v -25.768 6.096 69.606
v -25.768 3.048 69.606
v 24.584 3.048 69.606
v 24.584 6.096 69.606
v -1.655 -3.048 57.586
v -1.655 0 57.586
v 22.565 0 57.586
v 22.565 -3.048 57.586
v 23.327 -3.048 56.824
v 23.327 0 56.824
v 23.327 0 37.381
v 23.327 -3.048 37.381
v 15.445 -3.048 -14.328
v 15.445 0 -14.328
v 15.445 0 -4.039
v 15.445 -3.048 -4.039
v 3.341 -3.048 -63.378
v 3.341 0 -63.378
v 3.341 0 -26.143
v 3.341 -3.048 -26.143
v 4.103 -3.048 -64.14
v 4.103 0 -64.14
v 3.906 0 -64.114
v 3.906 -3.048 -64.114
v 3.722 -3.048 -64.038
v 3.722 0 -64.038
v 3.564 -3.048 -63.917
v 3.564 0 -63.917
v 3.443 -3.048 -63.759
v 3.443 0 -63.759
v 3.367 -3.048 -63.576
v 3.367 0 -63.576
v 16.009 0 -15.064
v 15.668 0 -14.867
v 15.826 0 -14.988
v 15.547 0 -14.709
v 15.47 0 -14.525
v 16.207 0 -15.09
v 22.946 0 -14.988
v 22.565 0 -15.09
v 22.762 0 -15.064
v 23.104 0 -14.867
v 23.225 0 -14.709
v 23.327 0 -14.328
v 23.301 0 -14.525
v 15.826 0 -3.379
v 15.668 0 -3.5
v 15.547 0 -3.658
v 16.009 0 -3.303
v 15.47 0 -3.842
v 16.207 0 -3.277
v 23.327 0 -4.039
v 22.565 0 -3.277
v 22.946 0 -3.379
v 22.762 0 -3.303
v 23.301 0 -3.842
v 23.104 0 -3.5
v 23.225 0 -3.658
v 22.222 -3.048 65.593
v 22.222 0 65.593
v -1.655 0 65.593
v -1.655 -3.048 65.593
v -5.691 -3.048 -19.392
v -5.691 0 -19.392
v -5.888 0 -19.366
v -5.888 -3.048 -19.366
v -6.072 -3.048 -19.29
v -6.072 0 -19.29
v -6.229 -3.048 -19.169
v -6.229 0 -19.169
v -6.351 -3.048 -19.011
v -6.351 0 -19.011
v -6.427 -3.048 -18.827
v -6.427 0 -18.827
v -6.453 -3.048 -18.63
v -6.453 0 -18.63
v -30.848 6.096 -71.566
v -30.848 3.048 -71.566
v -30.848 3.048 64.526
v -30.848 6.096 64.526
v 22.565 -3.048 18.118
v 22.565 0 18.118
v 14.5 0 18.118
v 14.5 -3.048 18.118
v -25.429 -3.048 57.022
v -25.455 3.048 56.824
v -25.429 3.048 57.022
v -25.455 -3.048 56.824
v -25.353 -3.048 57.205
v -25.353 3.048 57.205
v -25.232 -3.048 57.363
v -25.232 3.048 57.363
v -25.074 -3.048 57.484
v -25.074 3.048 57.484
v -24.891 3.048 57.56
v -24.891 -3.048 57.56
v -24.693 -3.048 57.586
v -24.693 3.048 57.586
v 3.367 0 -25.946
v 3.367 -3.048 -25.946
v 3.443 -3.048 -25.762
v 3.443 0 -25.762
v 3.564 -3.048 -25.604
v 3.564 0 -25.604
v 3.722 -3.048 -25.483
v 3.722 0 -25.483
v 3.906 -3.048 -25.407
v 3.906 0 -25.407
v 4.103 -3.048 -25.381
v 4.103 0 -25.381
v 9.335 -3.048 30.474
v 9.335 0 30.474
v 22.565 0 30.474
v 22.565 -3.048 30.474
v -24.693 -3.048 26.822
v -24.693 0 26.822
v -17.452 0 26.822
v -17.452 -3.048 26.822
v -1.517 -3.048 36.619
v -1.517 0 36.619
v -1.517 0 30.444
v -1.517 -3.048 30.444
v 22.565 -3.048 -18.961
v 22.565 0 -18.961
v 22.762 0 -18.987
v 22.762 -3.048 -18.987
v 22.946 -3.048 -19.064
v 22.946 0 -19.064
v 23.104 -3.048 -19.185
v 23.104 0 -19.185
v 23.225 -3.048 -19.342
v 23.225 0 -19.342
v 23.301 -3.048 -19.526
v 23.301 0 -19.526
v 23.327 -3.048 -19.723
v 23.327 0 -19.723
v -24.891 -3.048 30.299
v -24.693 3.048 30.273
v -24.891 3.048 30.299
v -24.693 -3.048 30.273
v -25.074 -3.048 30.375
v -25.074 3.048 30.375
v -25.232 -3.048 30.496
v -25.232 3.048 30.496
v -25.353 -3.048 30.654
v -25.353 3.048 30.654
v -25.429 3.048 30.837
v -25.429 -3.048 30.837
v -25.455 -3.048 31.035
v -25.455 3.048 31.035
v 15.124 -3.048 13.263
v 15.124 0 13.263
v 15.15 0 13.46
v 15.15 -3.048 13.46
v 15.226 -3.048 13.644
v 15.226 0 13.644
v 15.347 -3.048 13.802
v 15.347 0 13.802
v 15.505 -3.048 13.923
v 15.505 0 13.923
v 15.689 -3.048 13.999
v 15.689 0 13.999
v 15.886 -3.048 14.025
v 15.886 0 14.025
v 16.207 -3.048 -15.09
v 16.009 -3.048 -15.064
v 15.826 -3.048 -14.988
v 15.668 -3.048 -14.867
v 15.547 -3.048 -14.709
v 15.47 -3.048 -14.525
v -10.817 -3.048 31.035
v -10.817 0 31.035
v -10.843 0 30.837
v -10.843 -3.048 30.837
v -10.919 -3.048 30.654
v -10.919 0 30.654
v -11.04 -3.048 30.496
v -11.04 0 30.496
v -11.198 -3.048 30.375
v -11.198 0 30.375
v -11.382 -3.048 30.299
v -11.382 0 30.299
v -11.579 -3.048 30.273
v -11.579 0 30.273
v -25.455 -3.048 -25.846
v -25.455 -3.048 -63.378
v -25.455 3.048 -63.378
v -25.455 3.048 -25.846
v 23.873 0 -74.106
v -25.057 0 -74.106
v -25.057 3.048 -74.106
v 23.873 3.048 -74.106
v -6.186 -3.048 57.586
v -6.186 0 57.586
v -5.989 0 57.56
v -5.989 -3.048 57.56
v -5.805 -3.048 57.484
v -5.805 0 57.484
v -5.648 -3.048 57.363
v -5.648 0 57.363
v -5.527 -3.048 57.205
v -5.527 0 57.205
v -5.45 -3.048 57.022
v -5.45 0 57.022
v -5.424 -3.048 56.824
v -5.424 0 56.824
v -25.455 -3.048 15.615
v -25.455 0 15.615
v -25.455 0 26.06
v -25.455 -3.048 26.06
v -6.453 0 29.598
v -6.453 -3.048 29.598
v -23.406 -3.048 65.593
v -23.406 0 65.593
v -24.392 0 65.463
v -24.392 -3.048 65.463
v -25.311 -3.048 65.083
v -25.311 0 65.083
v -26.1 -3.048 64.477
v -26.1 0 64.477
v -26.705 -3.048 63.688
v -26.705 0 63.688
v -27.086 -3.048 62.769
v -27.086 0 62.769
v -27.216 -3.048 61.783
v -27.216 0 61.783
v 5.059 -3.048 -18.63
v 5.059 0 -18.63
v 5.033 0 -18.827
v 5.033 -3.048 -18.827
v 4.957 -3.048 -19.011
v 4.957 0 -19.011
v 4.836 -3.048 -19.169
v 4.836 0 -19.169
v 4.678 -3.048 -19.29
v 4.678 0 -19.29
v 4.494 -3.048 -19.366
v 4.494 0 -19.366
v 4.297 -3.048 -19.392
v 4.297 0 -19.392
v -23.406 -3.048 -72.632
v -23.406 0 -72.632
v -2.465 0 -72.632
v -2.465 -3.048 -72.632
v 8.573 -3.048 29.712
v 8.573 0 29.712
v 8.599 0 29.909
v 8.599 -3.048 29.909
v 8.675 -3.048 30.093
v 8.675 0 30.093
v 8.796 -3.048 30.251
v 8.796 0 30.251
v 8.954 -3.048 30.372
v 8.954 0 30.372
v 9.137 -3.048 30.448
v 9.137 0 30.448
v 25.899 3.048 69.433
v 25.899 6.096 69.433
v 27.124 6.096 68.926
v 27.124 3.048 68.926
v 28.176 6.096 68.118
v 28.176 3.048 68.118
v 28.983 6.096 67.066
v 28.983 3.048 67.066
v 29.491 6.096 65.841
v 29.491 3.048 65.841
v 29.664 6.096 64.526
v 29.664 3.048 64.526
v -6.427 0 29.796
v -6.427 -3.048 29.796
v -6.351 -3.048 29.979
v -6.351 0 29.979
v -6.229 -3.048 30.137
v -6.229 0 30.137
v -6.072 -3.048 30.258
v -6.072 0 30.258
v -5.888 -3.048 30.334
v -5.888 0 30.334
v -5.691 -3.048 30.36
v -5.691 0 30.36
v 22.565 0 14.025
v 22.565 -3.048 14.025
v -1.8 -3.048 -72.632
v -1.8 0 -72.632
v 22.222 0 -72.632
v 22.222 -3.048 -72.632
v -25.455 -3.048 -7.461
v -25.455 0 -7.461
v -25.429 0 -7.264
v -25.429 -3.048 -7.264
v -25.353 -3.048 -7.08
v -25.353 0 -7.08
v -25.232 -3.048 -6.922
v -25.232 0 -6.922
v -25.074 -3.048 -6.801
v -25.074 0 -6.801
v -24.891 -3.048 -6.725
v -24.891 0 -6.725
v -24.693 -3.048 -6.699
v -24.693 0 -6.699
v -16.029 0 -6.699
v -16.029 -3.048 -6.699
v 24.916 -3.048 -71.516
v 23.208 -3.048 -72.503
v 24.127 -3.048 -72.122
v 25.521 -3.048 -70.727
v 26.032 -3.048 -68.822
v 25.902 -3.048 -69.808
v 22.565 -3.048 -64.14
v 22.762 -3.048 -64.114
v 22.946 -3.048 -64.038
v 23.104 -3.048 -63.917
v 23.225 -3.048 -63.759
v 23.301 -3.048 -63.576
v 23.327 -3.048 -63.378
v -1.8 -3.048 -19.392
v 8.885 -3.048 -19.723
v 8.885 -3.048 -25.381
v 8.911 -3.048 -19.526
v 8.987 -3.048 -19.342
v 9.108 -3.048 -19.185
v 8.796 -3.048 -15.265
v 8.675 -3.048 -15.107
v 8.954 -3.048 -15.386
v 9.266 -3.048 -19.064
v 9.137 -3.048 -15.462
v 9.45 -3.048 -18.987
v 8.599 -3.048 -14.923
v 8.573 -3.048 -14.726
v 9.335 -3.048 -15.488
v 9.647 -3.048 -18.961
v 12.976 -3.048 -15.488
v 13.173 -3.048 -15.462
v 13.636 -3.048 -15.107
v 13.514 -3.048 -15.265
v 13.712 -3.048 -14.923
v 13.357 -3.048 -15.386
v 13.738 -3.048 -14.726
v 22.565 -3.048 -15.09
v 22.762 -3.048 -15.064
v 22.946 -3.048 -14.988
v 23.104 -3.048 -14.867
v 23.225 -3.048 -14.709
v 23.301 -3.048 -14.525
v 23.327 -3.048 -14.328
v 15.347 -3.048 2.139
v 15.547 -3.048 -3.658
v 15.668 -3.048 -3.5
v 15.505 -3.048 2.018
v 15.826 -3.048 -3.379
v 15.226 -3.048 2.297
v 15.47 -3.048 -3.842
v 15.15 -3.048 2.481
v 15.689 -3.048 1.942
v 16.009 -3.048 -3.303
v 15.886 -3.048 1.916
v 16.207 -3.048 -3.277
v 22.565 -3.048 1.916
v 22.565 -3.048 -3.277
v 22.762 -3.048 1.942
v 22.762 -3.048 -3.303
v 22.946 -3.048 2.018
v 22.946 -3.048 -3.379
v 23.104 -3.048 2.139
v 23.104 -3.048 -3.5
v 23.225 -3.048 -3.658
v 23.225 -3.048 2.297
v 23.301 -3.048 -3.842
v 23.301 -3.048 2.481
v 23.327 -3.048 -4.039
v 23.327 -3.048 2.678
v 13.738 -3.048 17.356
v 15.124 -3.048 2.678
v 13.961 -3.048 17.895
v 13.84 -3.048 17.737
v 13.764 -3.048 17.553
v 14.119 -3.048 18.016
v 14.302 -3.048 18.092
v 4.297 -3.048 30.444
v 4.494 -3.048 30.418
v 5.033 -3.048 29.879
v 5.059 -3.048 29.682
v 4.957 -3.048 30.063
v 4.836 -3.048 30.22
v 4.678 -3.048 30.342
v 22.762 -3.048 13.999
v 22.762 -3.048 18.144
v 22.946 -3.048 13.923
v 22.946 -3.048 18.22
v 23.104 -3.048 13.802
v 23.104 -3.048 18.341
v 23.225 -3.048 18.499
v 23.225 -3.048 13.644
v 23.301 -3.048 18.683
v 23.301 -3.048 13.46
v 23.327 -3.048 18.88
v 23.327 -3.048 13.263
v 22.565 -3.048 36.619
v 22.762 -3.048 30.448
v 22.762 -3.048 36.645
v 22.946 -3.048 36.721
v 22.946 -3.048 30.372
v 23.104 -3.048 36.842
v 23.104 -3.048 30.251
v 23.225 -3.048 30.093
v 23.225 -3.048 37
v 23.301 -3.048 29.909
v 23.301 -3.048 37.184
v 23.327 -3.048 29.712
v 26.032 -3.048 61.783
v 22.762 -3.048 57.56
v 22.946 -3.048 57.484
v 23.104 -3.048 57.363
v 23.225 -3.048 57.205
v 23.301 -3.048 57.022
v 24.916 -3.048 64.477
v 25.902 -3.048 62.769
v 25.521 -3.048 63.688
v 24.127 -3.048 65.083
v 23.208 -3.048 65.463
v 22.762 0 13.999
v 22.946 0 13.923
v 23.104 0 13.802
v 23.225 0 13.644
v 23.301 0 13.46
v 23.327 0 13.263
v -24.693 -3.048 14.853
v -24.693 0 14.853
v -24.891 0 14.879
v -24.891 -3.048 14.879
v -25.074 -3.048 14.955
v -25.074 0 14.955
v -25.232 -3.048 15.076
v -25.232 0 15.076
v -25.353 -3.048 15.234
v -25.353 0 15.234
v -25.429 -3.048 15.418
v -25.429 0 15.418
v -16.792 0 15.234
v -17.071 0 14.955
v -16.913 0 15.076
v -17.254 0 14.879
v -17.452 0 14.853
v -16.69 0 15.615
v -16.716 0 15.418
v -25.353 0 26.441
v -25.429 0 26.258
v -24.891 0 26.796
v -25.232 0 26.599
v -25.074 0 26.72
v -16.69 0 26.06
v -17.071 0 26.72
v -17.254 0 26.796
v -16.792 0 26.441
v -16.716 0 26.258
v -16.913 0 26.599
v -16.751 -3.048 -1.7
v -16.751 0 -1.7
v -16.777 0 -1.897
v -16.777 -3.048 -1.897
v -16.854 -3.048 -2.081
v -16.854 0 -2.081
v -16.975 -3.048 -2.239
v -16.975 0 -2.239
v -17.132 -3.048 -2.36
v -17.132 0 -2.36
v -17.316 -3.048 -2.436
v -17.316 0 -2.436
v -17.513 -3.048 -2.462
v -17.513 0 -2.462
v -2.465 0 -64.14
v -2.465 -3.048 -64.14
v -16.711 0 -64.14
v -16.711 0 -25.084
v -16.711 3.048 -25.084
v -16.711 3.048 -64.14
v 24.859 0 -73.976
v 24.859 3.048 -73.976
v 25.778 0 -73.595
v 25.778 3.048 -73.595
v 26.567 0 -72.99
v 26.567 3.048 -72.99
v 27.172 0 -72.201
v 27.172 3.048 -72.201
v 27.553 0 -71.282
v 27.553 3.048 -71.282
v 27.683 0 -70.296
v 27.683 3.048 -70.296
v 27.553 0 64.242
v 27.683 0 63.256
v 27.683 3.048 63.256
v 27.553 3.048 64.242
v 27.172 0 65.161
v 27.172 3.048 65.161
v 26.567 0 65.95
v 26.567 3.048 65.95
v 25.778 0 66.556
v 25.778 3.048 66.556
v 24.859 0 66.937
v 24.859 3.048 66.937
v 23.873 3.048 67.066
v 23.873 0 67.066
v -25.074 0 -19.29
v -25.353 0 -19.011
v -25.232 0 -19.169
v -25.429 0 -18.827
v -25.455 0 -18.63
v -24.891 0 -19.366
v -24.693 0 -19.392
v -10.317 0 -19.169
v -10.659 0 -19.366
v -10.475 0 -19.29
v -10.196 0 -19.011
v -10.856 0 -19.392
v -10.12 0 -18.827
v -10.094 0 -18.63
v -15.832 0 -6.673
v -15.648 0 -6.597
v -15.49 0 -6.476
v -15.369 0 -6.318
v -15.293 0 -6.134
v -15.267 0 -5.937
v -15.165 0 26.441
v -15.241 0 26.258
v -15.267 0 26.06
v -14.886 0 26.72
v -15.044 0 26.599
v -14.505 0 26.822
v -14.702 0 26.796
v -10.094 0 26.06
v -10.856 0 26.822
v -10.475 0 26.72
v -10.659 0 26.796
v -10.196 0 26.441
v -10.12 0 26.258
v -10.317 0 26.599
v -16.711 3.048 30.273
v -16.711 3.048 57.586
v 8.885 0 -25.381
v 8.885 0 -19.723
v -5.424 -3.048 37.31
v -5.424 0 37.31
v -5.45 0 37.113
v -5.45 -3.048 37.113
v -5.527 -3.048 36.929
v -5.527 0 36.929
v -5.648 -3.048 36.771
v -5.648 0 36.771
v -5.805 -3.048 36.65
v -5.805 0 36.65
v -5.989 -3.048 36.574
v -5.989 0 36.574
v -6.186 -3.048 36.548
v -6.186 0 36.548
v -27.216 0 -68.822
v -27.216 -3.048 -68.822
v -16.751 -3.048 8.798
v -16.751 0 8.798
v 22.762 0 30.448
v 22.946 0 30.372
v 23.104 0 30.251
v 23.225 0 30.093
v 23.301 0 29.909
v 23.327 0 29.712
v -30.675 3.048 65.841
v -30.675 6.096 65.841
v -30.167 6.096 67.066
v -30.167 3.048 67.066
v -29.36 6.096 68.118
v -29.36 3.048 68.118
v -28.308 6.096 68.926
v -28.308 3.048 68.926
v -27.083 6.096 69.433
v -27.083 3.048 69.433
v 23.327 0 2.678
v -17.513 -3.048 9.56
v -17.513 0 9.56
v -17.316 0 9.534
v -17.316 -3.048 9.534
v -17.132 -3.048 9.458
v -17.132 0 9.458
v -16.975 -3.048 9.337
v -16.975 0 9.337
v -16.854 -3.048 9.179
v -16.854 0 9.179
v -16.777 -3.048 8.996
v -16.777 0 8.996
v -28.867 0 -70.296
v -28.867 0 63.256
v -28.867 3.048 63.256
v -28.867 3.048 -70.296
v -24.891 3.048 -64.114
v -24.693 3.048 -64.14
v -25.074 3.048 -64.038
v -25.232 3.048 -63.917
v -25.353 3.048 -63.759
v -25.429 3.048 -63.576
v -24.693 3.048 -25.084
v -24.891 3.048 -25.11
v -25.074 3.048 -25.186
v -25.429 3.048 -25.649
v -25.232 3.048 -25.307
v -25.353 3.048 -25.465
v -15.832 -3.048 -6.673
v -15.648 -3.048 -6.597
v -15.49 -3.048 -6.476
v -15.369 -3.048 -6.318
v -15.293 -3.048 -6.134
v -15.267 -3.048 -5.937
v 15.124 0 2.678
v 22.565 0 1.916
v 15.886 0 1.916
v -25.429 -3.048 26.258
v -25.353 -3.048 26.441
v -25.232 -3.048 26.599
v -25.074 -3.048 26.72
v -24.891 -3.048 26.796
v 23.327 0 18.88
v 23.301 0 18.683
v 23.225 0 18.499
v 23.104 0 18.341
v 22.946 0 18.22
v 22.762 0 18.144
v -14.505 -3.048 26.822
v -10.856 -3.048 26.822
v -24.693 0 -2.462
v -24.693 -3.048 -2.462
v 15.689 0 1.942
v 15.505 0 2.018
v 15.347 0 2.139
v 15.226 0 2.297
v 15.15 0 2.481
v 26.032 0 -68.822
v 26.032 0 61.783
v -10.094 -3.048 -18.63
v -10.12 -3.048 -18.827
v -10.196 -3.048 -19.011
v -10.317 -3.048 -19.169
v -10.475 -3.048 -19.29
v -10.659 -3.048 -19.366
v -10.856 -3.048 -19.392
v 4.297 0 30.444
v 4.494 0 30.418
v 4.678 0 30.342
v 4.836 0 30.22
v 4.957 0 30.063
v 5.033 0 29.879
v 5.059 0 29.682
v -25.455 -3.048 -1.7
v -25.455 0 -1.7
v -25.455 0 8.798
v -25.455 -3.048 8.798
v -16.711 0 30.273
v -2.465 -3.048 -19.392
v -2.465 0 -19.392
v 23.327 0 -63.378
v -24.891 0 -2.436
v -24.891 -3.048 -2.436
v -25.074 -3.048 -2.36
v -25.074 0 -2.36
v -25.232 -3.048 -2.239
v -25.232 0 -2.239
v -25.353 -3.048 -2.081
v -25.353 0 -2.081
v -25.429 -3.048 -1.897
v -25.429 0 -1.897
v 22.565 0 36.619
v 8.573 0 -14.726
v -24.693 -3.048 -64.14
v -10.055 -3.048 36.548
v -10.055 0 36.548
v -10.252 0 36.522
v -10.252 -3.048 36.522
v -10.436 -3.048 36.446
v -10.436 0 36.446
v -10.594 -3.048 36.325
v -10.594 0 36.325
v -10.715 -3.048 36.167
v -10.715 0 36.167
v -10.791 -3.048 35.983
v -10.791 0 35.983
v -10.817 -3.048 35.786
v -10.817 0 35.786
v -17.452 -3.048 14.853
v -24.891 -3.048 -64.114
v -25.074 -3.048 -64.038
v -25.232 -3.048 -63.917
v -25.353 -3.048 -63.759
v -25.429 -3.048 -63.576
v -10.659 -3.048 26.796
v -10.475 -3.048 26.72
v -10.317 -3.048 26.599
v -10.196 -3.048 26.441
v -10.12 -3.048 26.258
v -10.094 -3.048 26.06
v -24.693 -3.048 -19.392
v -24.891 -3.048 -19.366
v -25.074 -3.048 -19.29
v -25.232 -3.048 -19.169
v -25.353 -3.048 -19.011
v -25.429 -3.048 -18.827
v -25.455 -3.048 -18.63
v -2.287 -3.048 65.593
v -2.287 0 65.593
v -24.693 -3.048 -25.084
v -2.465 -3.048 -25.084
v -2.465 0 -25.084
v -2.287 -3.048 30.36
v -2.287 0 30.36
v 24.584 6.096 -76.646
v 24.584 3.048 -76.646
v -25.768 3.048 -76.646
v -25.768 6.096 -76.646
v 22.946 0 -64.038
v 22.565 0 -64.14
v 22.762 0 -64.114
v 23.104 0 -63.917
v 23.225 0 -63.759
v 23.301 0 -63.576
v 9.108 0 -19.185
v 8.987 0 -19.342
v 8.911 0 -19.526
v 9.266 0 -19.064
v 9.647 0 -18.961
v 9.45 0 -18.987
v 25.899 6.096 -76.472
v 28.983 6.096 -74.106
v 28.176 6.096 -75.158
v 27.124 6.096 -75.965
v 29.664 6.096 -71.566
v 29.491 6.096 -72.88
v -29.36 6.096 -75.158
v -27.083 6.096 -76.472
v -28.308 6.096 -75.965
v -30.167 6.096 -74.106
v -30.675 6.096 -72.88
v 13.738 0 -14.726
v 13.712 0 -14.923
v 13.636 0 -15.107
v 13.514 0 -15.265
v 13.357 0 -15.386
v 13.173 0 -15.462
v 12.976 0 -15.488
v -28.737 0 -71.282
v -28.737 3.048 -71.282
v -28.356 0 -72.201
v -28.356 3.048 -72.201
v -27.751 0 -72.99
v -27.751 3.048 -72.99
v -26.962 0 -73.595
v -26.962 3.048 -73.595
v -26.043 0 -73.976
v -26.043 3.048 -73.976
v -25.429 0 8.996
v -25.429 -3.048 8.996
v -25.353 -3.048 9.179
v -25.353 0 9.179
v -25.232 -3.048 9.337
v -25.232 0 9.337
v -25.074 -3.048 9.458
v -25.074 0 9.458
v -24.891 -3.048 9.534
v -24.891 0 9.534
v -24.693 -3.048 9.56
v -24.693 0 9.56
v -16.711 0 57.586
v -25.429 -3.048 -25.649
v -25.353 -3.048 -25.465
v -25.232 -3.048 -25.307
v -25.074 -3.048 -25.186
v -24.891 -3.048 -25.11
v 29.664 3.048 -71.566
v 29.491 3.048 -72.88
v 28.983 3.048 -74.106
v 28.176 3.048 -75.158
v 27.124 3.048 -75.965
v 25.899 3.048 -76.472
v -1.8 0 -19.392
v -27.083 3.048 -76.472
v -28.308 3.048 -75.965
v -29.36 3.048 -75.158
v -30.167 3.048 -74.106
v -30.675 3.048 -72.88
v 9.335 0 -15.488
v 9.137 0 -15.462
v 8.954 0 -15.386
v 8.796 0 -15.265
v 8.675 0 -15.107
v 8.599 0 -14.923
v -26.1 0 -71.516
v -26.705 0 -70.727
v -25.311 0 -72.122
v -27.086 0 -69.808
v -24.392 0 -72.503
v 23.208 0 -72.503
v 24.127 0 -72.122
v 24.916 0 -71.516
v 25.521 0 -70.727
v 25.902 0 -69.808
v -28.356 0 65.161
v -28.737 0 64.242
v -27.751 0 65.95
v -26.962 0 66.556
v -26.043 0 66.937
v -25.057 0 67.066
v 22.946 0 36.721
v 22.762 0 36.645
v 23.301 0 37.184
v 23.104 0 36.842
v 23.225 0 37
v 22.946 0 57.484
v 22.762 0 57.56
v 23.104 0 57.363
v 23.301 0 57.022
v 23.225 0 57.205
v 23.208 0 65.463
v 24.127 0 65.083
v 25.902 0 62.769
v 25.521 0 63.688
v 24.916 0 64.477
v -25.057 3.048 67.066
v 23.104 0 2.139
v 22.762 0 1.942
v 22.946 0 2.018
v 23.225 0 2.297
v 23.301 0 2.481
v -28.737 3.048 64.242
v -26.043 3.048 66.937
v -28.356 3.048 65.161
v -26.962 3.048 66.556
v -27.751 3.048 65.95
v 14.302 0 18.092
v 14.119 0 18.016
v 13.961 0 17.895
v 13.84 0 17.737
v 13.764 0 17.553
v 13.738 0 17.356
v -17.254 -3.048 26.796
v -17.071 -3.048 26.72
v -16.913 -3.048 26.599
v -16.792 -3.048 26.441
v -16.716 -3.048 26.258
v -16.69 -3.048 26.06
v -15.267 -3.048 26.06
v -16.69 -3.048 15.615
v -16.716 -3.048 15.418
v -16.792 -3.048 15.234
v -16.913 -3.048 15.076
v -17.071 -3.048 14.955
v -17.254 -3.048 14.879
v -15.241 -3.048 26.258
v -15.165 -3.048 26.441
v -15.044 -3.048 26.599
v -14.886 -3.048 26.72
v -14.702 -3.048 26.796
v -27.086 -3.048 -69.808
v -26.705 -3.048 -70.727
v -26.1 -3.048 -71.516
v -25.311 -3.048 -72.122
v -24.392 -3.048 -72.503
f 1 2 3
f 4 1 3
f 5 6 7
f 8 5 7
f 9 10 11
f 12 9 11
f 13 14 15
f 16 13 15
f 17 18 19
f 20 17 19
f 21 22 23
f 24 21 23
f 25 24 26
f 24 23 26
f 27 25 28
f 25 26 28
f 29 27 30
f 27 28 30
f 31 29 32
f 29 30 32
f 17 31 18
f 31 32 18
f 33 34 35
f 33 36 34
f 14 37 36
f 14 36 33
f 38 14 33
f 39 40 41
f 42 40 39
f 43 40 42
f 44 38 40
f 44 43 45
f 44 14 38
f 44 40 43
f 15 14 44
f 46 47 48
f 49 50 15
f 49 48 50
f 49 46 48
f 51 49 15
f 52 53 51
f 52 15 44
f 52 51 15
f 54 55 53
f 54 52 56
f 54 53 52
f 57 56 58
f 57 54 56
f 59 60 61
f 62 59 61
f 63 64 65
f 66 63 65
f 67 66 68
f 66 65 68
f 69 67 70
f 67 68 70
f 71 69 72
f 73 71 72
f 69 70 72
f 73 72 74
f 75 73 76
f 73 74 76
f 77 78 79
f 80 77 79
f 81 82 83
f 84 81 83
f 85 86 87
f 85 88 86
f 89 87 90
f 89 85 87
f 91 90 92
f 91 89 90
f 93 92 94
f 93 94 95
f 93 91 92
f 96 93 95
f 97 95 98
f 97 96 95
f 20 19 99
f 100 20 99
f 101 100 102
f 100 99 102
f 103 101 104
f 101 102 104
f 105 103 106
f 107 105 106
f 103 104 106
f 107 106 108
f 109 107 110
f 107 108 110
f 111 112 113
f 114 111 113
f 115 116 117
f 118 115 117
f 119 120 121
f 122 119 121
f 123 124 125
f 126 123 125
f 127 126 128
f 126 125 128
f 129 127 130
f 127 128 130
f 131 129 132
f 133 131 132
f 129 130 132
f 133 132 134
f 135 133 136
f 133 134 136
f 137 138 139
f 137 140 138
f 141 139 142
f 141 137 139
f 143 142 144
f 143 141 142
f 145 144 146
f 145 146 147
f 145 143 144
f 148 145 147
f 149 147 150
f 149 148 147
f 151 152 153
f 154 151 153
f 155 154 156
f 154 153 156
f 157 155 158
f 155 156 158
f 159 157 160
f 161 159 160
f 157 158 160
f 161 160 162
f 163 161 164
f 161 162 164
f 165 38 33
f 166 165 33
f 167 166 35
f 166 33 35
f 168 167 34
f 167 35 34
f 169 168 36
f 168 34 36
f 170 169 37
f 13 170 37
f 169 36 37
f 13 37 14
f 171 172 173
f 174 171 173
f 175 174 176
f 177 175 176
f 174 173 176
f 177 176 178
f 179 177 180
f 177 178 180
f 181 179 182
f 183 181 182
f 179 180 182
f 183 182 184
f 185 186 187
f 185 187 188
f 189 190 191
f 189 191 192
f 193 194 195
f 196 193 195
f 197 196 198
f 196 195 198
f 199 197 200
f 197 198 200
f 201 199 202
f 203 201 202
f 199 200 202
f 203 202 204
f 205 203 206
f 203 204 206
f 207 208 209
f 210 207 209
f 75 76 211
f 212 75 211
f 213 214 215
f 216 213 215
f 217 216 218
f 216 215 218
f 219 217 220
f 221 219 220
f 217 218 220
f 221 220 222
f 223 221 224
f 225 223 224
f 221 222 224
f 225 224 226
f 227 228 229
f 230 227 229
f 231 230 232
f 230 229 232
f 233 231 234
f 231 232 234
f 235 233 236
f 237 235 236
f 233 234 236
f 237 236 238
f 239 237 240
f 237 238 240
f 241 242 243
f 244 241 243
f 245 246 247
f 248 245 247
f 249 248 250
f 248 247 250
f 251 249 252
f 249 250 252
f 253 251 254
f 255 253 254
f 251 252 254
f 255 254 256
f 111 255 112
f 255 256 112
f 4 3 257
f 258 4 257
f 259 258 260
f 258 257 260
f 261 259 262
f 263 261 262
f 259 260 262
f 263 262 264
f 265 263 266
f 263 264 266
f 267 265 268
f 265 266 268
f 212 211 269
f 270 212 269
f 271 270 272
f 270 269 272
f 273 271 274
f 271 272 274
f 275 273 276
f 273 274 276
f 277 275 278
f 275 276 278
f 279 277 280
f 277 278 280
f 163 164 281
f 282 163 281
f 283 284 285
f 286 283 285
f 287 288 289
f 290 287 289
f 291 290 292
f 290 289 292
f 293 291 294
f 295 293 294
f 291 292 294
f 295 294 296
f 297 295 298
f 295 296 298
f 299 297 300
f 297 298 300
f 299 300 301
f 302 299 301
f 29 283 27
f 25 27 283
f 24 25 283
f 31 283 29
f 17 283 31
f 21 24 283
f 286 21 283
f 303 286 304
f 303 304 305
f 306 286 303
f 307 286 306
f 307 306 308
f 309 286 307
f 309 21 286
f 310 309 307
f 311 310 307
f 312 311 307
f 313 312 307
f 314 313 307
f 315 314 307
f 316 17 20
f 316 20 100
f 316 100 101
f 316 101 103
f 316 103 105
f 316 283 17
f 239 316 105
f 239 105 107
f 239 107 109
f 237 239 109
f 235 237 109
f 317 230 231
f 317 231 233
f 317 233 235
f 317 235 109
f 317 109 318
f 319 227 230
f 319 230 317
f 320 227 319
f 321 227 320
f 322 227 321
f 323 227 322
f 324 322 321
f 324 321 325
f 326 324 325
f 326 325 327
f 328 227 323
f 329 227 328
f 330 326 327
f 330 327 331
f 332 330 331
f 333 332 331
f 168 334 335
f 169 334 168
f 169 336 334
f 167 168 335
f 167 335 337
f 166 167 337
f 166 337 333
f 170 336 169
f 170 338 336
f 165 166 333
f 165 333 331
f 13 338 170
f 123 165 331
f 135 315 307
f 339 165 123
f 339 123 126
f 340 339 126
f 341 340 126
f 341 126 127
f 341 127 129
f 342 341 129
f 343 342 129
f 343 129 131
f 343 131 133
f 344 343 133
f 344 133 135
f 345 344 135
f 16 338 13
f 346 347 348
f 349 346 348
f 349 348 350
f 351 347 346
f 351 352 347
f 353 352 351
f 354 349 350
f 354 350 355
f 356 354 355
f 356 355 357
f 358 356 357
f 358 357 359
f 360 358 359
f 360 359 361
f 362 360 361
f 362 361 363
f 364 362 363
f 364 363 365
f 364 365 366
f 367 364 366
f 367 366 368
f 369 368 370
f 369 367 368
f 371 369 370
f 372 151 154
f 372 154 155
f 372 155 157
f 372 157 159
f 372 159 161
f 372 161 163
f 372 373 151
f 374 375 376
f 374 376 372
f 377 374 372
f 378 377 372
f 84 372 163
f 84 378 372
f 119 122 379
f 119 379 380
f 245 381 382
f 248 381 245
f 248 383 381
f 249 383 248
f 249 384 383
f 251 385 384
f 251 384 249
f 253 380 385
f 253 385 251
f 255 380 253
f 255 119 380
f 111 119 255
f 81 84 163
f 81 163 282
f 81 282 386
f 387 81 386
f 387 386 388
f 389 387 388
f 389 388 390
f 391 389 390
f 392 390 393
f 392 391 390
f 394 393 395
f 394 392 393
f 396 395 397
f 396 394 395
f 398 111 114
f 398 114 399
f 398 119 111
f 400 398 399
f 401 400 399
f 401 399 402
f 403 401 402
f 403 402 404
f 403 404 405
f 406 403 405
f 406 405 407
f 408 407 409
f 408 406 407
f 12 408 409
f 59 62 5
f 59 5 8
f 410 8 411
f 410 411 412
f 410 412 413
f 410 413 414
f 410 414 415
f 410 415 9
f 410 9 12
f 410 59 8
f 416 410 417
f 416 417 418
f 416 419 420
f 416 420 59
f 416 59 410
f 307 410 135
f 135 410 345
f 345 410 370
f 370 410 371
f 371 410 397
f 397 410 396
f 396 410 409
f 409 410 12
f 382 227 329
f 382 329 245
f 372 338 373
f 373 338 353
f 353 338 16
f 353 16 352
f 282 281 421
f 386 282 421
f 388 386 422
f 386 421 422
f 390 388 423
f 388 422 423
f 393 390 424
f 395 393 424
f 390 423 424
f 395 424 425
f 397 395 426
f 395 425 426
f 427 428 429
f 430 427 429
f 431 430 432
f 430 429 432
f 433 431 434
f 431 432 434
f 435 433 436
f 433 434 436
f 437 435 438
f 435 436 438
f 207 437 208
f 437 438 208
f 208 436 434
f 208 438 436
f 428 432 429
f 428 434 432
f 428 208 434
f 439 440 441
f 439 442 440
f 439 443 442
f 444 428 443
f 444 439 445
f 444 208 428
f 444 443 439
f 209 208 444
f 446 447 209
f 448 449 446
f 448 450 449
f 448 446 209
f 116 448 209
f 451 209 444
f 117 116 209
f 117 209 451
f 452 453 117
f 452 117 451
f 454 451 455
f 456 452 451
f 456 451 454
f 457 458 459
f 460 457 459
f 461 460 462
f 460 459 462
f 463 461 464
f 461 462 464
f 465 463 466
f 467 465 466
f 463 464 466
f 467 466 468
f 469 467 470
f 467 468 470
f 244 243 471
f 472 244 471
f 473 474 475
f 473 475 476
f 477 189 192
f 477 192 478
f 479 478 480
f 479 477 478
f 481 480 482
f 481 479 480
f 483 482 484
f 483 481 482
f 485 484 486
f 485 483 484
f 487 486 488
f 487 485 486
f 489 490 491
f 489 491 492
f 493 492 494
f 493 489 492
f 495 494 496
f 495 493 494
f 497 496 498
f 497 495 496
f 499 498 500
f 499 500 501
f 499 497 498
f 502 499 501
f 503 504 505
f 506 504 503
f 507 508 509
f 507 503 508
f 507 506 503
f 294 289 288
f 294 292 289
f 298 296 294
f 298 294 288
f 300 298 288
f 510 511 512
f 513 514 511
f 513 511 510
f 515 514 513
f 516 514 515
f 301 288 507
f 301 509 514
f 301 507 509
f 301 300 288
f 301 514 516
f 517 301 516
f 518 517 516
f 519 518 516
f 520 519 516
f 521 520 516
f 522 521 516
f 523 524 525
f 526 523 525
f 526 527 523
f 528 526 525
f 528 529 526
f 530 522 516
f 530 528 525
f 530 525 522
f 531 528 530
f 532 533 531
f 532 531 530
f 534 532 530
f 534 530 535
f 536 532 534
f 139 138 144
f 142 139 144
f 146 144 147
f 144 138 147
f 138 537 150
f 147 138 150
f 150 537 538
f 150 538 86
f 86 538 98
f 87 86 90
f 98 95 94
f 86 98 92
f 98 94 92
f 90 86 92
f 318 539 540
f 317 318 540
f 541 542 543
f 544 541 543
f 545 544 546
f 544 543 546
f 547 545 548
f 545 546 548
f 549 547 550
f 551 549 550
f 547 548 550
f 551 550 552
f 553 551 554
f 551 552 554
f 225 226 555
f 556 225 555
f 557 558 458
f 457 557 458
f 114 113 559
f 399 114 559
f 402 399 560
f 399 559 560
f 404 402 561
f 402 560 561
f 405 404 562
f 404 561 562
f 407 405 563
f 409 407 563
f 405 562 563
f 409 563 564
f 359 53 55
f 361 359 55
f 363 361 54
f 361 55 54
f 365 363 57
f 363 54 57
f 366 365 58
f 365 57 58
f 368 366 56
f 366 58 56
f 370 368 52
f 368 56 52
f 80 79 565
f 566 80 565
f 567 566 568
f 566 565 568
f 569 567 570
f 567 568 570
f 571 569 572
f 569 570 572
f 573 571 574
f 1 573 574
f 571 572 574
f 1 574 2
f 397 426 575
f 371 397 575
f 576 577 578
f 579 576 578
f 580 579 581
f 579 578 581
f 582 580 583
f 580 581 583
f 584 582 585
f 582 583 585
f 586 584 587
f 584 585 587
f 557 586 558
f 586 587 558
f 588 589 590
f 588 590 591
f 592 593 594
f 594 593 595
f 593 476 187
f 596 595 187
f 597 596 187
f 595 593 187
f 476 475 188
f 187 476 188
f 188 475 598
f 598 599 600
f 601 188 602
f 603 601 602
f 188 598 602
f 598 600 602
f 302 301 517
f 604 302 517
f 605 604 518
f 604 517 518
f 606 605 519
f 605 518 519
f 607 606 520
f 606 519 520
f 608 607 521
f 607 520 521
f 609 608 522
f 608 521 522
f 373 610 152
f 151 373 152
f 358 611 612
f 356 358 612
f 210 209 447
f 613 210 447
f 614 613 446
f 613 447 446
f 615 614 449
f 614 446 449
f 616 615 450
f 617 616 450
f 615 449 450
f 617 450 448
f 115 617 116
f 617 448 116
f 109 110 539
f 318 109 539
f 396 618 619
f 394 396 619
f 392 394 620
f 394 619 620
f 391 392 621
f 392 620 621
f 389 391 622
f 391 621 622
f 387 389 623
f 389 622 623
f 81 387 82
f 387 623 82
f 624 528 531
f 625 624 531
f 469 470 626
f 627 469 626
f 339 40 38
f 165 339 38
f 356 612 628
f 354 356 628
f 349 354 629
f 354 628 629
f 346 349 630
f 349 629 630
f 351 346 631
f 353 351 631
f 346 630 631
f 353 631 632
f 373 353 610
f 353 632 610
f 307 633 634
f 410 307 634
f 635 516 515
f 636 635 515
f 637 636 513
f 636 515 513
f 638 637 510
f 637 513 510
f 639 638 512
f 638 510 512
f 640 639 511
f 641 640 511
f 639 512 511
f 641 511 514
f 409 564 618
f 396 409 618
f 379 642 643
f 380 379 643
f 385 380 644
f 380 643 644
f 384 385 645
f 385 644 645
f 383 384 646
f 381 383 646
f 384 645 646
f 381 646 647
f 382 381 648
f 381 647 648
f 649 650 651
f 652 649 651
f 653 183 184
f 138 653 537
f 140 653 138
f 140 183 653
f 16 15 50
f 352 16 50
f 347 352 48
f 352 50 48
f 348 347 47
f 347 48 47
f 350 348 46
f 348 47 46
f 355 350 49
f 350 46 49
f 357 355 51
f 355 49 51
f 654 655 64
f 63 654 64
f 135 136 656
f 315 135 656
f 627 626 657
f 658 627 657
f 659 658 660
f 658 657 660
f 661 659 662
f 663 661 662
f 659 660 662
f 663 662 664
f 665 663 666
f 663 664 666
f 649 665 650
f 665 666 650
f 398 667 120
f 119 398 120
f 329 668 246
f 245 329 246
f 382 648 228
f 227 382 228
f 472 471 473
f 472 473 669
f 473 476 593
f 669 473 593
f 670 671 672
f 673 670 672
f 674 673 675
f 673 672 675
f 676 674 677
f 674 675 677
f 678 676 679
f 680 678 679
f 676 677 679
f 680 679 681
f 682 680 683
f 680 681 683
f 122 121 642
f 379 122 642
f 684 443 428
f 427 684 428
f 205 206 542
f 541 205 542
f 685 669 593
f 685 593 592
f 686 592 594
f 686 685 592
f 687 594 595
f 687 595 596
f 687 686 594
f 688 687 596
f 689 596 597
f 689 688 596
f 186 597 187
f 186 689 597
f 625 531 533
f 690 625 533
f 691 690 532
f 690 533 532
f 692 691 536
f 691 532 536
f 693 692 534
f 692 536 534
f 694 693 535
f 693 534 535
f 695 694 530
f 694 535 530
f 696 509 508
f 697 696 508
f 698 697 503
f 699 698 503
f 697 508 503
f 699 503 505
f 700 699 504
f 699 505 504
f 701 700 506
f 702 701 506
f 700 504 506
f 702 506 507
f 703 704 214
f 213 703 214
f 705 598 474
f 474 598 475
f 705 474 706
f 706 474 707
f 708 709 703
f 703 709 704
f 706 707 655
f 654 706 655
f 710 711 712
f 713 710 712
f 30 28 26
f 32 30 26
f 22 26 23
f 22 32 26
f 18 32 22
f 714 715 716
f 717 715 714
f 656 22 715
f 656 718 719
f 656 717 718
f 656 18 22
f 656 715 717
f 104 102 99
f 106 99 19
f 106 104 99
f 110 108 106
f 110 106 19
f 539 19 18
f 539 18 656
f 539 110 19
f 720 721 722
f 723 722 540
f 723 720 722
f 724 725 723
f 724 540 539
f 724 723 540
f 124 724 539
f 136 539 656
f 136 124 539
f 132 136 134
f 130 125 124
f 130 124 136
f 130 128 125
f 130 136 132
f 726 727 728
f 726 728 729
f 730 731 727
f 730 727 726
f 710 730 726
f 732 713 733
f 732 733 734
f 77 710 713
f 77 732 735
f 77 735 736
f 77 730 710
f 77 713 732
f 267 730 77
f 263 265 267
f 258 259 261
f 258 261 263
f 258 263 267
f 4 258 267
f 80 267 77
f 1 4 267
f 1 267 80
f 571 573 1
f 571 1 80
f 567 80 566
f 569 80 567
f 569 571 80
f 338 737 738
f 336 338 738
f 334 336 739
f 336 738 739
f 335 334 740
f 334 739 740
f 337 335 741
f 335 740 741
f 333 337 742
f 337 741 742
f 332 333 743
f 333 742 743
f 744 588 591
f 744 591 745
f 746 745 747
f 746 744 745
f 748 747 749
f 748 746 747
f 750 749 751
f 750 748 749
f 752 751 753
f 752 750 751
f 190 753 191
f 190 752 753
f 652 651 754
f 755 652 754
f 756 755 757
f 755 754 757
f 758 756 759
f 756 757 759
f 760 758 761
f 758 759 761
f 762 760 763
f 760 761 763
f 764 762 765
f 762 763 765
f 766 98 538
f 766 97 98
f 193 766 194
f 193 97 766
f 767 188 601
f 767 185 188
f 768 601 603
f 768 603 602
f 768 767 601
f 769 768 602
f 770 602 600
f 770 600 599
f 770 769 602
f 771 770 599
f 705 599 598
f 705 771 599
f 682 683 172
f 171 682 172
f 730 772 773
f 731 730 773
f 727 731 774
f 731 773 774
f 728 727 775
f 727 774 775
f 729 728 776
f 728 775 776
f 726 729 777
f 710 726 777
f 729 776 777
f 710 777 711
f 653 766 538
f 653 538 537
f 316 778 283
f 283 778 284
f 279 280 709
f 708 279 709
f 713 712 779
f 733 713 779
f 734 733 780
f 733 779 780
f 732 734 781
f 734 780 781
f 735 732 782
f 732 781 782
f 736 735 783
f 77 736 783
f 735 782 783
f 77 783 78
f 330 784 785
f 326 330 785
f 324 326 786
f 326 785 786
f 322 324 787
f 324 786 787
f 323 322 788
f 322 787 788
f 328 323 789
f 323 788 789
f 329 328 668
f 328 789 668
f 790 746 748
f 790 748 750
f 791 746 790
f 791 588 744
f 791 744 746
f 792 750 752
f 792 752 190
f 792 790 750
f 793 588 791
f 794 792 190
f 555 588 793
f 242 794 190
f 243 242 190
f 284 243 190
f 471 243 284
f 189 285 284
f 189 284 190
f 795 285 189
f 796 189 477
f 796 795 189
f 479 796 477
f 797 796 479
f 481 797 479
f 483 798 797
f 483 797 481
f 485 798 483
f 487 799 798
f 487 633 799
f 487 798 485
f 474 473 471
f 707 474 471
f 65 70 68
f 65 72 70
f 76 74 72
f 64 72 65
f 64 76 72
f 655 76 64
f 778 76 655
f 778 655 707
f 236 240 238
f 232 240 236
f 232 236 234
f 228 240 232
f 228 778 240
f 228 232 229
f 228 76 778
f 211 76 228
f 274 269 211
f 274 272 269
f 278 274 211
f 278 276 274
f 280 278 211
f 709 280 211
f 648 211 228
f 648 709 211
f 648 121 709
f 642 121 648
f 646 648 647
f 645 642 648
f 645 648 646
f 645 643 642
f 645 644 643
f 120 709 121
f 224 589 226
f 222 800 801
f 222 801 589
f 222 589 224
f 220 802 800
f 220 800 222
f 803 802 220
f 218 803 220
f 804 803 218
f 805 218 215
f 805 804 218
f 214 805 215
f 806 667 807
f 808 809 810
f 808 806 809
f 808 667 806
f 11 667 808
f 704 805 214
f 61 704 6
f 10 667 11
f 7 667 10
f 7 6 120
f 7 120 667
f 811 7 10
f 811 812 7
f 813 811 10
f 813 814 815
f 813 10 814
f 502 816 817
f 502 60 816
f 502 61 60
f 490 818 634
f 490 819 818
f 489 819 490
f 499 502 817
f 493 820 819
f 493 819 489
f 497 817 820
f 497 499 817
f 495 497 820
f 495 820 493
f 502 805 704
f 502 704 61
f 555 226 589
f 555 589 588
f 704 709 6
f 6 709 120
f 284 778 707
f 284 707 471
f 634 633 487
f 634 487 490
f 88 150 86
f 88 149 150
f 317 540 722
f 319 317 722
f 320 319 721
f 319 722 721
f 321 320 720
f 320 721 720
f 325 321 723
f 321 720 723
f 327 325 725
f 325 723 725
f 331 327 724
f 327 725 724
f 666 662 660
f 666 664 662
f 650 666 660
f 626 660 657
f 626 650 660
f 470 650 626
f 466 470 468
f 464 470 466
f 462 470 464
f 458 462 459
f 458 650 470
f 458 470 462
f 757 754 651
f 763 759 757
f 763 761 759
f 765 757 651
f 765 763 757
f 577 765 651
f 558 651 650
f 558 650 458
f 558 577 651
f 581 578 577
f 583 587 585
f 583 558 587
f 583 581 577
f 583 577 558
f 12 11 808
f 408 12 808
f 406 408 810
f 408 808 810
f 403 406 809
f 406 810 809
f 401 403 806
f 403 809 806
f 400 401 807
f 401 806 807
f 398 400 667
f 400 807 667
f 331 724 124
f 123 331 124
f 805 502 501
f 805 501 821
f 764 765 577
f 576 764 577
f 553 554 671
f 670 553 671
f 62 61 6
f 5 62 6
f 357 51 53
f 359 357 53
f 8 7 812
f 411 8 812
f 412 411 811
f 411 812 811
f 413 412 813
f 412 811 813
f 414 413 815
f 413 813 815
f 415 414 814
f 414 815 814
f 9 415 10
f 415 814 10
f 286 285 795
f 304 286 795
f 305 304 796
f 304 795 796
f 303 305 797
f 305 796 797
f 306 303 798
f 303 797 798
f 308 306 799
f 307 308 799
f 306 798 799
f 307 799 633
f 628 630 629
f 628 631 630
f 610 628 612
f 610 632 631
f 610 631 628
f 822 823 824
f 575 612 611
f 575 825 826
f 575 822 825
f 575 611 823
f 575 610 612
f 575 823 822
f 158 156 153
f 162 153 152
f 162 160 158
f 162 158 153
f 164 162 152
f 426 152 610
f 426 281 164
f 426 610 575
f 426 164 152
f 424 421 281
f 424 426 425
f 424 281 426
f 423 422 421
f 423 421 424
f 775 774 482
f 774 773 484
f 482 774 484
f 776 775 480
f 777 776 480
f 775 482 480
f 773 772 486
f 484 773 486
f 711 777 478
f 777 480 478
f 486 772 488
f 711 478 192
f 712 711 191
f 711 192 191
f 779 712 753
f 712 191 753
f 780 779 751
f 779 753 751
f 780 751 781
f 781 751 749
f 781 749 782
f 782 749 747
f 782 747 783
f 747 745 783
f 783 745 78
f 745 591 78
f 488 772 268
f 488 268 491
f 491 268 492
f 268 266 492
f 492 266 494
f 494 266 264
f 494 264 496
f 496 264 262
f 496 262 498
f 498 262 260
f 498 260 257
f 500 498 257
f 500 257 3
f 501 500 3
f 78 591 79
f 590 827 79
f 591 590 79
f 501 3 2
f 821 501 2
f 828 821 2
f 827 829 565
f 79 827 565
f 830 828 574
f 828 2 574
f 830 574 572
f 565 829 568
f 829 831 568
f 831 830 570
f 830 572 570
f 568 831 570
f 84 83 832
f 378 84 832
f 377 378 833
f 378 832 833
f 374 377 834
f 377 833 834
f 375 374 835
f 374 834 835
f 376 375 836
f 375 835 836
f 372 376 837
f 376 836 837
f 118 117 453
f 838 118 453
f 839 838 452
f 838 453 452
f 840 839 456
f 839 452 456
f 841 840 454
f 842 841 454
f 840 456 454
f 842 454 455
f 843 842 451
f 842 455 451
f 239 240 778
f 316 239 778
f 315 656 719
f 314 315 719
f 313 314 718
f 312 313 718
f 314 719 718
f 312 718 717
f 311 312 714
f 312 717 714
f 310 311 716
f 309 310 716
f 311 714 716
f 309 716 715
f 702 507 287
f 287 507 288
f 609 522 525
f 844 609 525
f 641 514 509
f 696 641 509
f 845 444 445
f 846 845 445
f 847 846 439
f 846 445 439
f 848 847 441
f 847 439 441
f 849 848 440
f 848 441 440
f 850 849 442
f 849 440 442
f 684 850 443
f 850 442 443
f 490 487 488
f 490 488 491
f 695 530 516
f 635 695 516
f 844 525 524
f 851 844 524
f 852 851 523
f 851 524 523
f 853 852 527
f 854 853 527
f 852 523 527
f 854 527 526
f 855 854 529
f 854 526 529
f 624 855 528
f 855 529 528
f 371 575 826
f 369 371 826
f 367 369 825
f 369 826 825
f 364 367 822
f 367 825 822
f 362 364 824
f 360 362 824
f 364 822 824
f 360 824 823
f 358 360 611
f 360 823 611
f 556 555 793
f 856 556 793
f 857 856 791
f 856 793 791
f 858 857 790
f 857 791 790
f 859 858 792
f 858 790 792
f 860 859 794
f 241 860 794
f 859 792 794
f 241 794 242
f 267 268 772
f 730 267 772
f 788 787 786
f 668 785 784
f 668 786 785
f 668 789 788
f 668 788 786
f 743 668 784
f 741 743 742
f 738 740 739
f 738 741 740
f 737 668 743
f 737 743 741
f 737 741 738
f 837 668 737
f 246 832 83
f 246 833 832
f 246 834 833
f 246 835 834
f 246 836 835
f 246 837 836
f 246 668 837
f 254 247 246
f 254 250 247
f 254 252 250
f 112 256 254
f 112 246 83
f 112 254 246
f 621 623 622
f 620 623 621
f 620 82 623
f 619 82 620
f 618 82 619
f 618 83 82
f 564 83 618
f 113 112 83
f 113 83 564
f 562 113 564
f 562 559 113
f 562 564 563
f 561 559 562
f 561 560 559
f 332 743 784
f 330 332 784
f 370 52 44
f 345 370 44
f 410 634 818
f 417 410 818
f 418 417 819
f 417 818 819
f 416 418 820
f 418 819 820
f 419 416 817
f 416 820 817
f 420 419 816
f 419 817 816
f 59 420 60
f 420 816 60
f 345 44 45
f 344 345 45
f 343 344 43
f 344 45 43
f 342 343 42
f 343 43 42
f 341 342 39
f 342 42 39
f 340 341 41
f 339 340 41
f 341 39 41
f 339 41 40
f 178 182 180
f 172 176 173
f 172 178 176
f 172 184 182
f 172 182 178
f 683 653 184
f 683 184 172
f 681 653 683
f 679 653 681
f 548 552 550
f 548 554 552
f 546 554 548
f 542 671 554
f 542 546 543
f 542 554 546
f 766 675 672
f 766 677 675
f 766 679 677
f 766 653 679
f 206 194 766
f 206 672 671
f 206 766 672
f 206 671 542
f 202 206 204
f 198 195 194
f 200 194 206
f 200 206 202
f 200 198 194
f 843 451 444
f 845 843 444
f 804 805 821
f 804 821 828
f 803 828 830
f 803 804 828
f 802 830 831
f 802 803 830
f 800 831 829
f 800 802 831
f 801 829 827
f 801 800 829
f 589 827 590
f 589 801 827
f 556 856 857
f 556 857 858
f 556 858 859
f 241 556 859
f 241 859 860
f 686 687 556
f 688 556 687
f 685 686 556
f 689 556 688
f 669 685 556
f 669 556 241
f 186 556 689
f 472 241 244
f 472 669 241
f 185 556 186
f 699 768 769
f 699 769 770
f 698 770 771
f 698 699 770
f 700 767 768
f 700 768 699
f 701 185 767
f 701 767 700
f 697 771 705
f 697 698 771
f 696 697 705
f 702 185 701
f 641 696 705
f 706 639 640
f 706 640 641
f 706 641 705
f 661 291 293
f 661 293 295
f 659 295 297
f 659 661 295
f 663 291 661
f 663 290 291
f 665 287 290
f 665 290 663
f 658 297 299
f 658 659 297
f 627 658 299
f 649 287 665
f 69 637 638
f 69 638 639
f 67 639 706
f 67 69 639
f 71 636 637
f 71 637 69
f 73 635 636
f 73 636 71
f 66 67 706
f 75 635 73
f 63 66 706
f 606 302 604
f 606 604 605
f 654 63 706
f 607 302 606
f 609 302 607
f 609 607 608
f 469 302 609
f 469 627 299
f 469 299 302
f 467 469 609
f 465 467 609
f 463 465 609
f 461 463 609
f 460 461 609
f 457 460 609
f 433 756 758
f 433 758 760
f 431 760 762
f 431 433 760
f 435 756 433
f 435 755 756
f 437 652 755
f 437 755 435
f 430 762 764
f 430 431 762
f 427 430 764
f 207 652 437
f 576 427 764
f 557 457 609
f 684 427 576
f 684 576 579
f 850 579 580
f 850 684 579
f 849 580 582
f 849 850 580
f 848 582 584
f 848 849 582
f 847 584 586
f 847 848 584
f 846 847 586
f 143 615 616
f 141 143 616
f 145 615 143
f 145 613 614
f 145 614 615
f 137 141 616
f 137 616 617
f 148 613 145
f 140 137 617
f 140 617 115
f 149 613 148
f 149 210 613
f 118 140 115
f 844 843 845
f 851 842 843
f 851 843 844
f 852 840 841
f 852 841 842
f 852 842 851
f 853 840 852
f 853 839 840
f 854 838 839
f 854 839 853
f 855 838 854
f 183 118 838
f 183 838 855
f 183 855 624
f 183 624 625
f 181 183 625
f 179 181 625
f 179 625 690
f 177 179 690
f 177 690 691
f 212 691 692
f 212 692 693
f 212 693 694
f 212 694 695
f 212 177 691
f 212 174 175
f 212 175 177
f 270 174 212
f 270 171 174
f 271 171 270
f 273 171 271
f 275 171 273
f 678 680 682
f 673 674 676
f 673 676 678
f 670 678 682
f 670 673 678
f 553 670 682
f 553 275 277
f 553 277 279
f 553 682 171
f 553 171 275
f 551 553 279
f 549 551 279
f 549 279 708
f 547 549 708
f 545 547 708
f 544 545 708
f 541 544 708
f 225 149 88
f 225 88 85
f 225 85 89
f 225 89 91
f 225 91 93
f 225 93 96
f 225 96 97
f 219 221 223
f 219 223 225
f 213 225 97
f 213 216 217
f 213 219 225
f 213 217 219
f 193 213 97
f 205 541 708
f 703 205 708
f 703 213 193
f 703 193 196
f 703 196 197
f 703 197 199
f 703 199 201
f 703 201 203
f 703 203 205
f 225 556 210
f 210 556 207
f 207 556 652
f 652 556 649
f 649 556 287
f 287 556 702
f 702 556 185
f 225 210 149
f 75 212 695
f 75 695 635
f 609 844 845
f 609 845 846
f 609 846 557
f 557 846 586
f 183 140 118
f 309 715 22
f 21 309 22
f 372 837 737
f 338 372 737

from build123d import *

# Parameters (mm, degrees)
F1_DEPTH = 3.048
F3_DEPTH = 3.048
F5_DEPTH = 3.048


with BuildPart() as f1:
    # F0 (on Front) → F1 (new body)
    with BuildSketch(Plane.XZ):
        with BuildLine():
            Line((-27.215604, 61.783131), (-27.215604, -68.822387))
            ThreePointArc((-27.215604, -68.822387), (-26.099681, -71.516464), (-23.405604, -72.632387))
            Line((-23.405604, -72.632387), (-2.464669, -72.632387))
            Line((-2.464669, -72.632387), (-2.464669, -64.140432))
            Line((-2.464669, -64.140432), (-24.693408, -64.140432))
            ThreePointArc((-24.693408, -64.140432), (-25.232223, -63.917247), (-25.455408, -63.378432))
            Line((-25.455408, -63.378432), (-25.455408, -25.846069))
            ThreePointArc((-25.455408, -25.846069), (-25.232223, -25.307254), (-24.693408, -25.084069))
            Line((-24.693408, -25.084069), (-2.464669, -25.084069))
            Line((-2.464669, -25.084069), (-2.464669, -19.391987))
            Line((-2.464669, -19.391987), (-5.690682, -19.391987))
            ThreePointArc((-5.690682, -19.391987), (-6.229498, -19.168803), (-6.452682, -18.629987))
            Line((-6.452682, -18.629987), (-6.452682, 29.59835))
            ThreePointArc((-6.452682, 29.59835), (-6.229498, 30.137166), (-5.690682, 30.36035))
            Line((-5.690682, 30.36035), (-2.287077, 30.36035))
            Line((-2.287077, 30.36035), (-2.287077, 65.593131))
            Line((-2.287077, 65.593131), (-23.405604, 65.593131))
            ThreePointArc((-23.405604, 65.593131), (-26.099681, 64.477208), (-27.215604, 61.783131))
        make_face()
        with BuildLine():
            ThreePointArc((-25.455408, 8.798287), (-25.232223, 9.337102), (-24.693408, 9.560287))
            Line((-24.693408, 9.560287), (-17.513451, 9.560287))
            ThreePointArc((-17.513451, 9.560287), (-16.974636, 9.337102), (-16.751451, 8.798287))
            Line((-16.751451, 8.798287), (-16.751451, -1.699802))
            ThreePointArc((-16.751451, -1.699802), (-16.974636, -2.238618), (-17.513451, -2.461802))
            Line((-17.513451, -2.461802), (-24.693408, -2.461802))
            ThreePointArc((-24.693408, -2.461802), (-25.232223, -2.238618), (-25.455408, -1.699802))
            Line((-25.455408, -1.699802), (-25.455408, 8.798287))
        make_face(mode=Mode.SUBTRACT)
        with BuildLine():
            ThreePointArc((-25.455408, -7.460729), (-25.232223, -6.921914), (-24.693408, -6.698729))
            Line((-24.693408, -6.698729), (-16.028815, -6.698729))
            ThreePointArc((-16.028815, -6.698729), (-15.49, -6.475544), (-15.266815, -5.936729))
            Line((-15.266815, -5.936729), (-15.266815, 26.060438))
            ThreePointArc((-15.266815, 26.060438), (-15.043631, 26.599254), (-14.504815, 26.822438))
            Line((-14.504815, 26.822438), (-10.855766, 26.822438))
            ThreePointArc((-10.855766, 26.822438), (-10.316951, 26.599254), (-10.093766, 26.060438))
            Line((-10.093766, 26.060438), (-10.093766, -18.629987))
            ThreePointArc((-10.093766, -18.629987), (-10.316951, -19.168803), (-10.855766, -19.391987))
            Line((-10.855766, -19.391987), (-24.693408, -19.391987))
            ThreePointArc((-24.693408, -19.391987), (-25.232223, -19.168803), (-25.455408, -18.629987))
            Line((-25.455408, -18.629987), (-25.455408, -7.460729))
        make_face(mode=Mode.SUBTRACT)
        with BuildLine():
            ThreePointArc((-25.455408, 26.060438), (-25.232223, 26.599254), (-24.693408, 26.822438))
            Line((-24.693408, 26.822438), (-17.451537, 26.822438))
            ThreePointArc((-17.451537, 26.822438), (-16.912722, 26.599254), (-16.689537, 26.060438))
            Line((-16.689537, 26.060438), (-16.689537, 15.614866))
            ThreePointArc((-16.689537, 15.614866), (-16.912722, 15.07605), (-17.451537, 14.852866))
            Line((-17.451537, 14.852866), (-24.693408, 14.852866))
            ThreePointArc((-24.693408, 14.852866), (-25.232223, 15.07605), (-25.455408, 15.614866))
            Line((-25.455408, 15.614866), (-25.455408, 26.060438))
        make_face(mode=Mode.SUBTRACT)
        with BuildLine():
            Line((-25.455408, 31.034609), (-25.455408, 56.824335))
            ThreePointArc((-25.455408, 56.824335), (-25.232223, 57.36315), (-24.693408, 57.586335))
            Line((-24.693408, 57.586335), (-6.186478, 57.586335))
            ThreePointArc((-6.186478, 57.586335), (-5.647663, 57.36315), (-5.424478, 56.824335))
            Line((-5.424478, 56.824335), (-5.424478, 37.310197))
            ThreePointArc((-5.424478, 37.310197), (-5.647663, 36.771382), (-6.186478, 36.548197))
            Line((-6.186478, 36.548197), (-10.055168, 36.548197))
            ThreePointArc((-10.055168, 36.548197), (-10.593984, 36.325013), (-10.817168, 35.786197))
            Line((-10.817168, 35.786197), (-10.817168, 31.034609))
            ThreePointArc((-10.817168, 31.034609), (-11.040353, 30.495793), (-11.579168, 30.272609))
            Line((-11.579168, 30.272609), (-24.693408, 30.272609))
            ThreePointArc((-24.693408, 30.272609), (-25.232223, 30.495793), (-25.455408, 31.034609))
        make_face(mode=Mode.SUBTRACT)
        with BuildLine():
            Line((-1.799683, -19.391987), (-1.799683, -72.632387))
            Line((-1.799683, -72.632387), (22.221839, -72.632387))
            ThreePointArc((22.221839, -72.632387), (24.915916, -71.516464), (26.031839, -68.822387))
            Line((26.031839, -68.822387), (26.031839, 61.783131))
            ThreePointArc((26.031839, 61.783131), (24.915916, 64.477208), (22.221839, 65.593131))
            Line((22.221839, 65.593131), (-1.654555, 65.593131))
            Line((-1.654555, 65.593131), (-1.654555, 57.586335))
            Line((-1.654555, 57.586335), (22.565058, 57.586335))
            ThreePointArc((22.565058, 57.586335), (23.103874, 57.36315), (23.327058, 56.824335))
            Line((23.327058, 56.824335), (23.327058, 37.38084))
            ThreePointArc((23.327058, 37.38084), (23.103874, 36.842025), (22.565058, 36.61884))
            Line((22.565058, 36.61884), (-1.516778, 36.61884))
            Line((-1.516778, 36.61884), (-1.516778, 30.44359))
            Line((-1.516778, 30.44359), (4.297159, 30.44359))
            ThreePointArc((4.297159, 30.44359), (4.835975, 30.220406), (5.059159, 29.68159))
            Line((5.059159, 29.68159), (5.059159, -18.629987))
            ThreePointArc((5.059159, -18.629987), (4.835975, -19.168803), (4.297159, -19.391987))
            Line((4.297159, -19.391987), (-1.799683, -19.391987))
        make_face()
        with BuildLine():
            Line((23.327058, -19.723452), (23.327058, -63.378432))
            ThreePointArc((23.327058, -63.378432), (23.103874, -63.917247), (22.565058, -64.140432))
            Line((22.565058, -64.140432), (4.102913, -64.140432))
            ThreePointArc((4.102913, -64.140432), (3.564097, -63.917247), (3.340913, -63.378432))
            Line((3.340913, -63.378432), (3.340913, -26.143166))
            ThreePointArc((3.340913, -26.143166), (3.564097, -25.604351), (4.102913, -25.381166))
            Line((4.102913, -25.381166), (8.884725, -25.381166))
            Line((8.884725, -25.381166), (8.884725, -19.723452))
            ThreePointArc((8.884725, -19.723452), (9.10791, -19.184637), (9.646725, -18.961452))
            Line((9.646725, -18.961452), (22.565058, -18.961452))
            ThreePointArc((22.565058, -18.961452), (23.103874, -19.184637), (23.327058, -19.723452))
        make_face(mode=Mode.SUBTRACT)
        with BuildLine():
            Line((16.206523, -3.277048), (22.565058, -3.277048))
            ThreePointArc((22.565058, -3.277048), (23.103874, -3.500233), (23.327058, -4.039048))
            Line((23.327058, -4.039048), (23.327058, -14.328273))
            ThreePointArc((23.327058, -14.328273), (23.103874, -14.867088), (22.565058, -15.090273))
            Line((22.565058, -15.090273), (16.206523, -15.090273))
            ThreePointArc((16.206523, -15.090273), (15.667707, -14.867088), (15.444523, -14.328273))
            Line((15.444523, -14.328273), (15.444523, -4.039048))
            ThreePointArc((15.444523, -4.039048), (15.667707, -3.500233), (16.206523, -3.277048))
        make_face(mode=Mode.SUBTRACT)
        with BuildLine():
            Line((9.334675, 30.473812), (22.565058, 30.473812))
            ThreePointArc((22.565058, 30.473812), (23.103874, 30.250627), (23.327058, 29.711812))
            Line((23.327058, 29.711812), (23.327058, 18.880225))
            ThreePointArc((23.327058, 18.880225), (23.103874, 18.34141), (22.565058, 18.118225))
            Line((22.565058, 18.118225), (14.499665, 18.118225))
            ThreePointArc((14.499665, 18.118225), (13.96085, 17.89504), (13.737665, 17.356225))
            Line((13.737665, 17.356225), (13.737665, -14.725744))
            ThreePointArc((13.737665, -14.725744), (13.514481, -15.264559), (12.975665, -15.487744))
            Line((12.975665, -15.487744), (9.334675, -15.487744))
            ThreePointArc((9.334675, -15.487744), (8.79586, -15.264559), (8.572675, -14.725744))
            Line((8.572675, -14.725744), (8.572675, 29.711812))
            ThreePointArc((8.572675, 29.711812), (8.79586, 30.250627), (9.334675, 30.473812))
        make_face(mode=Mode.SUBTRACT)
        with BuildLine():
            Line((15.88612, 14.02483), (22.565058, 14.02483))
            ThreePointArc((22.565058, 14.02483), (23.103874, 13.801646), (23.327058, 13.26283))
            Line((23.327058, 13.26283), (23.327058, 2.677905))
            ThreePointArc((23.327058, 2.677905), (23.103874, 2.139089), (22.565058, 1.915905))
            Line((22.565058, 1.915905), (15.88612, 1.915905))
            ThreePointArc((15.88612, 1.915905), (15.347304, 2.139089), (15.12412, 2.677905))
            Line((15.12412, 2.677905), (15.12412, 13.26283))
            ThreePointArc((15.12412, 13.26283), (15.347304, 13.801646), (15.88612, 14.02483))
        make_face(mode=Mode.SUBTRACT)
    extrude(amount=F1_DEPTH)

    # F2 (on Front) → F3 (join)
    with BuildSketch(Plane.XZ):
        with BuildLine():
            Line((-25.056604, -74.105591), (23.872839, -74.105591))
            ThreePointArc((23.872839, -74.105591), (26.566916, -72.989667), (27.682839, -70.295591))
            Line((27.682839, -70.295591), (27.682839, 63.256334))
            ThreePointArc((27.682839, 63.256334), (26.566916, 65.950411), (23.872839, 67.066334))
            Line((23.872839, 67.066334), (-25.056604, 67.066334))
            ThreePointArc((-25.056604, 67.066334), (-27.750681, 65.950411), (-28.866604, 63.256334))
            Line((-28.866604, 63.256334), (-28.866604, -70.295591))
            ThreePointArc((-28.866604, -70.295591), (-27.750681, -72.989667), (-25.056604, -74.105591))
        make_face()
        with BuildLine():
            Line((-16.71073, -64.140432), (-24.693408, -64.140432))
            ThreePointArc((-24.693408, -64.140432), (-25.232223, -63.917247), (-25.455408, -63.378432))
            Line((-25.455408, -63.378432), (-25.455408, -25.846069))
            ThreePointArc((-25.455408, -25.846069), (-25.232223, -25.307254), (-24.693408, -25.084069))
            Line((-24.693408, -25.084069), (-16.71073, -25.084069))
            Line((-16.71073, -25.084069), (-16.71073, -64.140432))
        make_face(mode=Mode.SUBTRACT)
        with BuildLine():
            Line((-16.71073, 57.586335), (-16.71073, 30.272609))
            Line((-16.71073, 30.272609), (-24.693408, 30.272609))
            ThreePointArc((-24.693408, 30.272609), (-25.232223, 30.495793), (-25.455408, 31.034609))
            Line((-25.455408, 31.034609), (-25.455408, 56.824335))
            ThreePointArc((-25.455408, 56.824335), (-25.232223, 57.36315), (-24.693408, 57.586335))
            Line((-24.693408, 57.586335), (-16.71073, 57.586335))
        make_face(mode=Mode.SUBTRACT)
    extrude(amount=-F3_DEPTH)

    # F4 (on face) → F5 (join)
    with BuildSketch(Plane(origin=(0, 3.048, 0), x_dir=(-1, 0, 0), z_dir=(0, 1, 0))):
        with BuildLine():
            Line((-29.664039, 64.526334), (-29.664039, -71.565591))
            ThreePointArc((-29.664039, -71.565591), (-28.176141, -75.157693), (-24.584039, -76.645591))
            Line((-24.584039, -76.645591), (25.767804, -76.645591))
            ThreePointArc((25.767804, -76.645591), (29.359906, -75.157693), (30.847804, -71.565591))
            Line((30.847804, -71.565591), (30.847804, 64.526334))
            ThreePointArc((30.847804, 64.526334), (29.359906, 68.118437), (25.767804, 69.606334))
            Line((25.767804, 69.606334), (-24.584039, 69.606334))
            ThreePointArc((-24.584039, 69.606334), (-28.176141, 68.118437), (-29.664039, 64.526334))
        make_face()
    extrude(amount=F5_DEPTH)


solid = f1.part
